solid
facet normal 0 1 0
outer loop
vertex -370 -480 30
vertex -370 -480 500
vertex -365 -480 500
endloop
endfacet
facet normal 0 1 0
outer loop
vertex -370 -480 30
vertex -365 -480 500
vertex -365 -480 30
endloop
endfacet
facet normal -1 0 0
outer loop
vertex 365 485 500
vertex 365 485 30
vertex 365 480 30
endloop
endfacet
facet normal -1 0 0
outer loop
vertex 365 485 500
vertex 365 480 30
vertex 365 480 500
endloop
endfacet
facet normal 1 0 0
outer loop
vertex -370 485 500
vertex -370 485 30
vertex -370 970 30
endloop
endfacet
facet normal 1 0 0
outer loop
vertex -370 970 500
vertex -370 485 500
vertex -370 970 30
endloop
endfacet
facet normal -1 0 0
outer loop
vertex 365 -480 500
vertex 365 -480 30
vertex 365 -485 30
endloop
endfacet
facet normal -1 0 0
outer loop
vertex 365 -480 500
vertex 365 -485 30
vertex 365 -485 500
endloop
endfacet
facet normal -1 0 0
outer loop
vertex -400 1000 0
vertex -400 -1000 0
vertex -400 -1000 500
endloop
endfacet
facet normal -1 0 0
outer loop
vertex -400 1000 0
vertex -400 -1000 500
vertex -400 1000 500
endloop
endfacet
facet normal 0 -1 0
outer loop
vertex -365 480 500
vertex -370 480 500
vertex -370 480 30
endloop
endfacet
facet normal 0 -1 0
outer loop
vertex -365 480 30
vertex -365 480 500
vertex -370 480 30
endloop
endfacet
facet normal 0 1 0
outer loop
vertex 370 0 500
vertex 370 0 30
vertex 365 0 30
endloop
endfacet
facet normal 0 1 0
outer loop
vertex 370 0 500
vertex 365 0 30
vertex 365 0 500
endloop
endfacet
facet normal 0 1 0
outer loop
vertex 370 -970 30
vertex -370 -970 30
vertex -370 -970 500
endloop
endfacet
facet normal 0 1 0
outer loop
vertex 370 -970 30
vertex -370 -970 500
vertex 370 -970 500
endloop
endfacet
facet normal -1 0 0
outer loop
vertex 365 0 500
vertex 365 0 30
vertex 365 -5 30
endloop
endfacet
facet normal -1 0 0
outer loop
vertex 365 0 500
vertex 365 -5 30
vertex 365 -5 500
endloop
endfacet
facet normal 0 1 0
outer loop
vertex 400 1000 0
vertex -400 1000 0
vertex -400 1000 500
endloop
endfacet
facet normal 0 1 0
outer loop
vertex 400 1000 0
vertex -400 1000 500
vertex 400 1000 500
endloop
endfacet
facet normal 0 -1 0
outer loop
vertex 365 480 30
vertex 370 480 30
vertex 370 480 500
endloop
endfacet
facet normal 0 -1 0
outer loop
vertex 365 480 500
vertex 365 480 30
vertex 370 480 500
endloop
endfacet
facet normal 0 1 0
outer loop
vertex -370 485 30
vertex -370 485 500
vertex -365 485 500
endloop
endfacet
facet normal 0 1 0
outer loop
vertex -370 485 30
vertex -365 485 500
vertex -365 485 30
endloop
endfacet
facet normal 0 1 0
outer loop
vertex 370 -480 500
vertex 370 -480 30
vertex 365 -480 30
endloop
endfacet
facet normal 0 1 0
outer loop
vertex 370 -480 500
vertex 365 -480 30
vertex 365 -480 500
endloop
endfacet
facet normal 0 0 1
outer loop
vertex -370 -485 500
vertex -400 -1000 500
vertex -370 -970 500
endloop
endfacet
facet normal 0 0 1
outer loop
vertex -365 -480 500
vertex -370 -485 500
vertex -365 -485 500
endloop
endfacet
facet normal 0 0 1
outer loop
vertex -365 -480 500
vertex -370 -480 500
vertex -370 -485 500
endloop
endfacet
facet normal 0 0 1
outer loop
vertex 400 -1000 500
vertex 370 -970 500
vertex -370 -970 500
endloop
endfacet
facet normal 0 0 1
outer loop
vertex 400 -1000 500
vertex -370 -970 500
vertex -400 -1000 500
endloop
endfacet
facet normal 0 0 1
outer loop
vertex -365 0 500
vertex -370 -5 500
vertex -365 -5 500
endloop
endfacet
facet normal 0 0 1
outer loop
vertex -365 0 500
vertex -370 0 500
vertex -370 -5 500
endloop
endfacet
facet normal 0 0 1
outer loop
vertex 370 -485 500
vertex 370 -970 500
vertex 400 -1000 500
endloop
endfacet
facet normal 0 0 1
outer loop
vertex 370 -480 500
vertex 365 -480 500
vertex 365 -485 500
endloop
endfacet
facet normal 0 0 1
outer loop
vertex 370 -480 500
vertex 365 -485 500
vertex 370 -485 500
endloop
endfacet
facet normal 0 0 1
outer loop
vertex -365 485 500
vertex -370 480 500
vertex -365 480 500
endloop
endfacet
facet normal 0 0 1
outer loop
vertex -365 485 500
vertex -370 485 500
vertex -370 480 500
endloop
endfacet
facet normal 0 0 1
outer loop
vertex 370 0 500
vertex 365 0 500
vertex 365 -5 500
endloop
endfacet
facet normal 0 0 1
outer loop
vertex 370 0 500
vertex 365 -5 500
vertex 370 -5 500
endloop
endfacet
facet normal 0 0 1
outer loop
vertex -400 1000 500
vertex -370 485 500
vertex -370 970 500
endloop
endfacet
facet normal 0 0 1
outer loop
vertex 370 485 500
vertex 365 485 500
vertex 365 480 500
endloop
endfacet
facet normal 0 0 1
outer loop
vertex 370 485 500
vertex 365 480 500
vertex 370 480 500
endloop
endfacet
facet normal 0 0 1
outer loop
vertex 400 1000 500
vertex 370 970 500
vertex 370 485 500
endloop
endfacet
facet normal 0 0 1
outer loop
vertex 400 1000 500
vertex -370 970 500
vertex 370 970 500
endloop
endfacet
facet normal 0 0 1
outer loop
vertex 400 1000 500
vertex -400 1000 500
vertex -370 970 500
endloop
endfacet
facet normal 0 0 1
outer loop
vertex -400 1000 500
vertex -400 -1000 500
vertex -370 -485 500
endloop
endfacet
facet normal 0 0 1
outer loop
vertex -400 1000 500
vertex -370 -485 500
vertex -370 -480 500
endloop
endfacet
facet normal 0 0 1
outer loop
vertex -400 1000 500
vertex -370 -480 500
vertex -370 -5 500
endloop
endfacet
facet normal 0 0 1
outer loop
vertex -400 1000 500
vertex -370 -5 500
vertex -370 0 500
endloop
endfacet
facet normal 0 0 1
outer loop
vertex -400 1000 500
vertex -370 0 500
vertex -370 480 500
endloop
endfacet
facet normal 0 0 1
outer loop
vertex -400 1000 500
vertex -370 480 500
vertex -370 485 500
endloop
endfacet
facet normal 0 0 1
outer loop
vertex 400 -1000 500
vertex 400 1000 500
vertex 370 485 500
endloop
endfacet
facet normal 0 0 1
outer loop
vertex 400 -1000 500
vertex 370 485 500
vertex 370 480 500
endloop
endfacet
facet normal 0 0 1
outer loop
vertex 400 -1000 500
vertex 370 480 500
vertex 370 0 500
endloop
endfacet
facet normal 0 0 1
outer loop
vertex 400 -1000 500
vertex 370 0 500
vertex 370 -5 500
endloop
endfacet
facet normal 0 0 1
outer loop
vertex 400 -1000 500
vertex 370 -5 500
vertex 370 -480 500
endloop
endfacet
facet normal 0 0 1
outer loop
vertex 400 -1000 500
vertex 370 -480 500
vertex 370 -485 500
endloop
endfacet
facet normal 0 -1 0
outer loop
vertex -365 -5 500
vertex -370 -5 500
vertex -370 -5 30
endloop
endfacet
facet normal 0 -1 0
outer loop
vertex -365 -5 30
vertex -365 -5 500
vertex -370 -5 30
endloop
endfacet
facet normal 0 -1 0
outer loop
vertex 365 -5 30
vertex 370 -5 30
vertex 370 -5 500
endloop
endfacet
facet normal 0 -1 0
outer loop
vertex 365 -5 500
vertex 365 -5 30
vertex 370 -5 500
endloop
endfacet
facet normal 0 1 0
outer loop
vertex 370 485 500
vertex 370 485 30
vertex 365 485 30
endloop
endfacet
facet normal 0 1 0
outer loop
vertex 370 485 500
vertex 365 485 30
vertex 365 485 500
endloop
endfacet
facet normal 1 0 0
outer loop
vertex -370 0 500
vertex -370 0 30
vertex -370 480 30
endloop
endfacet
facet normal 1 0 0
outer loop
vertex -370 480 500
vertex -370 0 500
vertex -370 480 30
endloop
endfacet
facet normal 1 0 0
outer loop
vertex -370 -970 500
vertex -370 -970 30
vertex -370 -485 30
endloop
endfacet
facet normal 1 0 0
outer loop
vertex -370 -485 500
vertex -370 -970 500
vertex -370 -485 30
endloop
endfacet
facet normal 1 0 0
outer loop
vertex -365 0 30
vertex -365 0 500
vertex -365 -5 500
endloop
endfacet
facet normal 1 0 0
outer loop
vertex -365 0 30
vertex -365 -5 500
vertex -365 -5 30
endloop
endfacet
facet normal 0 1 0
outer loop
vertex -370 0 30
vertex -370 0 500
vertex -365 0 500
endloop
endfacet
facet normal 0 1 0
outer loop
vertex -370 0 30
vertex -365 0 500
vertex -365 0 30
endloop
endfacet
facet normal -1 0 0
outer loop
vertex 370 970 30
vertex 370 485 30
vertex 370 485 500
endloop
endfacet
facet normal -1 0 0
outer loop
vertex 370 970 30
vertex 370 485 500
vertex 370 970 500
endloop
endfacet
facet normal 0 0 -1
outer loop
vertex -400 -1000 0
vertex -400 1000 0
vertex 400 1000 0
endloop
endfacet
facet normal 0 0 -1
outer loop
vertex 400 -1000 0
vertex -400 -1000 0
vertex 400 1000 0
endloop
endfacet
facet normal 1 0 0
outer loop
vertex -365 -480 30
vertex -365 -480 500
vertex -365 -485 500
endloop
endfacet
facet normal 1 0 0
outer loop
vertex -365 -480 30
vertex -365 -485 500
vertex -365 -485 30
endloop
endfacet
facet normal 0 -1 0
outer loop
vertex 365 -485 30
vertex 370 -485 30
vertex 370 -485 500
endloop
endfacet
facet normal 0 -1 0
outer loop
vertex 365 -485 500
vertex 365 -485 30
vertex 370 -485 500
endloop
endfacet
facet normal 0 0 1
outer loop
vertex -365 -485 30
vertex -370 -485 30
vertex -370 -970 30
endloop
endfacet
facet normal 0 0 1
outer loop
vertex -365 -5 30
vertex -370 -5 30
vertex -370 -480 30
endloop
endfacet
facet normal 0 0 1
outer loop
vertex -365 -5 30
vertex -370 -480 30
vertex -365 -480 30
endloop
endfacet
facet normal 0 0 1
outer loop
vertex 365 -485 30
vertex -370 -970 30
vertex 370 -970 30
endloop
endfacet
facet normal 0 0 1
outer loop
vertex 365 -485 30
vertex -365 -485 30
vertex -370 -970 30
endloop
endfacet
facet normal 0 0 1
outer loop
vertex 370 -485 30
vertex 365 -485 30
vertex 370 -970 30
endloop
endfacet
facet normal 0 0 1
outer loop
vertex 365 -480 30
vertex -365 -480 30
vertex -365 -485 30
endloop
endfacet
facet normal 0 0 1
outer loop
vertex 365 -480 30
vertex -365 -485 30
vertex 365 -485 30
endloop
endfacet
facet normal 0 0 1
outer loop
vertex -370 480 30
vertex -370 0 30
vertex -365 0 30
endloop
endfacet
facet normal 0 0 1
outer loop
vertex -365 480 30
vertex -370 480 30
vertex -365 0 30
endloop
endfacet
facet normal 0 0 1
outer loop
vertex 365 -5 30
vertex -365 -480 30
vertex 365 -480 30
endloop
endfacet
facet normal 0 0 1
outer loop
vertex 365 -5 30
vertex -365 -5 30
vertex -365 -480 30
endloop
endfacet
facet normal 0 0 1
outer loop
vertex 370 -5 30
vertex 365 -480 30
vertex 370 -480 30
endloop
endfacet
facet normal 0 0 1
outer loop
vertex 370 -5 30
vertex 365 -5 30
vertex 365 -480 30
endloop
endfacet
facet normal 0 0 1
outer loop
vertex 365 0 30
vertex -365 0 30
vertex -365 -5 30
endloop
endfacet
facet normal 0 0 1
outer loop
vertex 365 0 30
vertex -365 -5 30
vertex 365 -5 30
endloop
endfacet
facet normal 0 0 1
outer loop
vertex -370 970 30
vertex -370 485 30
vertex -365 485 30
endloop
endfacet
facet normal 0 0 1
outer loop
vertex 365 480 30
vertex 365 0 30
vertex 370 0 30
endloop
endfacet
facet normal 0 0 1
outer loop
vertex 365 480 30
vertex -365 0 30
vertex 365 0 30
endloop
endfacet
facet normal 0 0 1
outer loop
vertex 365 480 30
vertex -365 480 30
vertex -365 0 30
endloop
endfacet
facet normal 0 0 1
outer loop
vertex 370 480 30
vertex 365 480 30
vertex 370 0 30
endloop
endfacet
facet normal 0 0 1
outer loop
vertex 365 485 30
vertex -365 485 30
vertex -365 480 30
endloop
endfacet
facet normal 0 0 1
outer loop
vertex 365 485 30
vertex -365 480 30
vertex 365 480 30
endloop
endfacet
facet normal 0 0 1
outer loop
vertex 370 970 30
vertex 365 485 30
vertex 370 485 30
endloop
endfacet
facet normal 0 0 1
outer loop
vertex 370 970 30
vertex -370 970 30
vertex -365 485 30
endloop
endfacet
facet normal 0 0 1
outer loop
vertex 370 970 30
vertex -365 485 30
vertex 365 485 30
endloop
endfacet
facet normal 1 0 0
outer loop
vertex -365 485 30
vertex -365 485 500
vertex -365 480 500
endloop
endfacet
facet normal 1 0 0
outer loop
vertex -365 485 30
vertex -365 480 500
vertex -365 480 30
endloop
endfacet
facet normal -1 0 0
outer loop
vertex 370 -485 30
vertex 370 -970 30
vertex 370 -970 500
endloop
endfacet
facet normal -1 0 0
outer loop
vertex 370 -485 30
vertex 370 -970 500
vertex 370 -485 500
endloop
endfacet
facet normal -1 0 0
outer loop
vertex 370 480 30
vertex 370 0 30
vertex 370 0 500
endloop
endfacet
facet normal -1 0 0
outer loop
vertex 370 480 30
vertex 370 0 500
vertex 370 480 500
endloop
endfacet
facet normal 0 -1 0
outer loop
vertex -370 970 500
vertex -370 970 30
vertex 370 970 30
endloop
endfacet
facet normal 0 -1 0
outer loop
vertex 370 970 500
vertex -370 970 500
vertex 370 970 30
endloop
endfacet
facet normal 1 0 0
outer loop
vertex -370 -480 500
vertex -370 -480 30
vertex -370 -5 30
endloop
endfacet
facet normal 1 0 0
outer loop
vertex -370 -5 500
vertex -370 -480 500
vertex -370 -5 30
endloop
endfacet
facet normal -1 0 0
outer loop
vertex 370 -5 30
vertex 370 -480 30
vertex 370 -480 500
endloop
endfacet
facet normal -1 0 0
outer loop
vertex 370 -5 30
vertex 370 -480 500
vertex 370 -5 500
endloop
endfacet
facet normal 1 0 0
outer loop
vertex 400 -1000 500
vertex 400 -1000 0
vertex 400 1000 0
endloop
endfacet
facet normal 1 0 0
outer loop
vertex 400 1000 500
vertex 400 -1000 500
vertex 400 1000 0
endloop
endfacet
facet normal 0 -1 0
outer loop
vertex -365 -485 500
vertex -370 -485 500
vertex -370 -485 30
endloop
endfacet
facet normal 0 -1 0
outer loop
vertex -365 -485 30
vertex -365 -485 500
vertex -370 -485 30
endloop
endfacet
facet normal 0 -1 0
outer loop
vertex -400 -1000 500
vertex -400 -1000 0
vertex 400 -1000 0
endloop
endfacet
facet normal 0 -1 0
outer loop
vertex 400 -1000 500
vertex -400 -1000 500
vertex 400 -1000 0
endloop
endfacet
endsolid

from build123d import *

# Parameters (mm, degrees)
SKETCH1_W           = 800
SKETCH1_H           = 2000
BOSS_EXTRUDE1_DEPTH = 500
SHELL2_T            = -30
SKETCH6_W           = 470
SKETCH6_H           = 5
BOSS_EXTRUDE2_DEPTH = 5
SKETCH8_W           = 470
SKETCH8_H           = 5
BOSS_EXTRUDE3_DEPTH = 5
SKETCH9_W           = 470
SKETCH9_H           = 5
BOSS_EXTRUDE4_DEPTH = 5
SKETCH11_W          = 470
SKETCH11_H          = 5
BOSS_EXTRUDE5_DEPTH = 5
SKETCH16_W          = 470
SKETCH16_H          = 5
BOSS_EXTRUDE6_DEPTH = 5
SKETCH17_W          = 470
SKETCH17_H          = 5
BOSS_EXTRUDE7_DEPTH = 5


with BuildPart() as part:
    # Sketch1 → Boss-Extrude1 (new body)
    with BuildSketch(Plane.XY):
        Rectangle(SKETCH1_W, SKETCH1_H)
    extrude(amount=BOSS_EXTRUDE1_DEPTH)

    # Shell2
    shell2_openings = [part.faces().sort_by_distance(p)[0] for p in [
        (0, 0, 500),
    ]]
    offset(amount=SHELL2_T, openings=shell2_openings, kind=Kind.INTERSECTION)

    # Sketch6 → Boss-Extrude2 (add)
    with BuildSketch(Plane.ZY.offset(-370)):
        with Locations((265, 482.5)):
            Rectangle(SKETCH6_W, SKETCH6_H)
    extrude(amount=BOSS_EXTRUDE2_DEPTH)

    # Sketch8 → Boss-Extrude3 (add)
    with BuildSketch(Plane(origin=(-370, 0, 0), x_dir=(0, 0, -1), z_dir=(1, 0, 0))):
        with Locations((-265, 482.5)):
            Rectangle(SKETCH8_W, SKETCH8_H)
    extrude(amount=BOSS_EXTRUDE3_DEPTH)

    # Sketch9 → Boss-Extrude4 (add)
    with BuildSketch(Plane.ZY.offset(-370)):
        with Locations((265, -2.5)):
            Rectangle(SKETCH9_W, SKETCH9_H)
    extrude(amount=BOSS_EXTRUDE4_DEPTH)

    # Sketch11 → Boss-Extrude5 (add)
    with BuildSketch(Plane(origin=(-370, 0, 0), x_dir=(0, 0, -1), z_dir=(1, 0, 0))):
        with Locations((-265, -2.5)):
            Rectangle(SKETCH11_W, SKETCH11_H)
    extrude(amount=BOSS_EXTRUDE5_DEPTH)

    # Sketch16 → Boss-Extrude6 (add)
    with BuildSketch(Plane.ZY.offset(-370)):
        with Locations((265, -482.5)):
            Rectangle(SKETCH16_W, SKETCH16_H)
    extrude(amount=BOSS_EXTRUDE6_DEPTH)

    # Sketch17 → Boss-Extrude7 (add)
    with BuildSketch(Plane(origin=(-370, 0, 0), x_dir=(0, 0, -1), z_dir=(1, 0, 0))):
        with Locations((-265, -482.5)):
            Rectangle(SKETCH17_W, SKETCH17_H)
    extrude(amount=BOSS_EXTRUDE7_DEPTH)


solid = part.part
